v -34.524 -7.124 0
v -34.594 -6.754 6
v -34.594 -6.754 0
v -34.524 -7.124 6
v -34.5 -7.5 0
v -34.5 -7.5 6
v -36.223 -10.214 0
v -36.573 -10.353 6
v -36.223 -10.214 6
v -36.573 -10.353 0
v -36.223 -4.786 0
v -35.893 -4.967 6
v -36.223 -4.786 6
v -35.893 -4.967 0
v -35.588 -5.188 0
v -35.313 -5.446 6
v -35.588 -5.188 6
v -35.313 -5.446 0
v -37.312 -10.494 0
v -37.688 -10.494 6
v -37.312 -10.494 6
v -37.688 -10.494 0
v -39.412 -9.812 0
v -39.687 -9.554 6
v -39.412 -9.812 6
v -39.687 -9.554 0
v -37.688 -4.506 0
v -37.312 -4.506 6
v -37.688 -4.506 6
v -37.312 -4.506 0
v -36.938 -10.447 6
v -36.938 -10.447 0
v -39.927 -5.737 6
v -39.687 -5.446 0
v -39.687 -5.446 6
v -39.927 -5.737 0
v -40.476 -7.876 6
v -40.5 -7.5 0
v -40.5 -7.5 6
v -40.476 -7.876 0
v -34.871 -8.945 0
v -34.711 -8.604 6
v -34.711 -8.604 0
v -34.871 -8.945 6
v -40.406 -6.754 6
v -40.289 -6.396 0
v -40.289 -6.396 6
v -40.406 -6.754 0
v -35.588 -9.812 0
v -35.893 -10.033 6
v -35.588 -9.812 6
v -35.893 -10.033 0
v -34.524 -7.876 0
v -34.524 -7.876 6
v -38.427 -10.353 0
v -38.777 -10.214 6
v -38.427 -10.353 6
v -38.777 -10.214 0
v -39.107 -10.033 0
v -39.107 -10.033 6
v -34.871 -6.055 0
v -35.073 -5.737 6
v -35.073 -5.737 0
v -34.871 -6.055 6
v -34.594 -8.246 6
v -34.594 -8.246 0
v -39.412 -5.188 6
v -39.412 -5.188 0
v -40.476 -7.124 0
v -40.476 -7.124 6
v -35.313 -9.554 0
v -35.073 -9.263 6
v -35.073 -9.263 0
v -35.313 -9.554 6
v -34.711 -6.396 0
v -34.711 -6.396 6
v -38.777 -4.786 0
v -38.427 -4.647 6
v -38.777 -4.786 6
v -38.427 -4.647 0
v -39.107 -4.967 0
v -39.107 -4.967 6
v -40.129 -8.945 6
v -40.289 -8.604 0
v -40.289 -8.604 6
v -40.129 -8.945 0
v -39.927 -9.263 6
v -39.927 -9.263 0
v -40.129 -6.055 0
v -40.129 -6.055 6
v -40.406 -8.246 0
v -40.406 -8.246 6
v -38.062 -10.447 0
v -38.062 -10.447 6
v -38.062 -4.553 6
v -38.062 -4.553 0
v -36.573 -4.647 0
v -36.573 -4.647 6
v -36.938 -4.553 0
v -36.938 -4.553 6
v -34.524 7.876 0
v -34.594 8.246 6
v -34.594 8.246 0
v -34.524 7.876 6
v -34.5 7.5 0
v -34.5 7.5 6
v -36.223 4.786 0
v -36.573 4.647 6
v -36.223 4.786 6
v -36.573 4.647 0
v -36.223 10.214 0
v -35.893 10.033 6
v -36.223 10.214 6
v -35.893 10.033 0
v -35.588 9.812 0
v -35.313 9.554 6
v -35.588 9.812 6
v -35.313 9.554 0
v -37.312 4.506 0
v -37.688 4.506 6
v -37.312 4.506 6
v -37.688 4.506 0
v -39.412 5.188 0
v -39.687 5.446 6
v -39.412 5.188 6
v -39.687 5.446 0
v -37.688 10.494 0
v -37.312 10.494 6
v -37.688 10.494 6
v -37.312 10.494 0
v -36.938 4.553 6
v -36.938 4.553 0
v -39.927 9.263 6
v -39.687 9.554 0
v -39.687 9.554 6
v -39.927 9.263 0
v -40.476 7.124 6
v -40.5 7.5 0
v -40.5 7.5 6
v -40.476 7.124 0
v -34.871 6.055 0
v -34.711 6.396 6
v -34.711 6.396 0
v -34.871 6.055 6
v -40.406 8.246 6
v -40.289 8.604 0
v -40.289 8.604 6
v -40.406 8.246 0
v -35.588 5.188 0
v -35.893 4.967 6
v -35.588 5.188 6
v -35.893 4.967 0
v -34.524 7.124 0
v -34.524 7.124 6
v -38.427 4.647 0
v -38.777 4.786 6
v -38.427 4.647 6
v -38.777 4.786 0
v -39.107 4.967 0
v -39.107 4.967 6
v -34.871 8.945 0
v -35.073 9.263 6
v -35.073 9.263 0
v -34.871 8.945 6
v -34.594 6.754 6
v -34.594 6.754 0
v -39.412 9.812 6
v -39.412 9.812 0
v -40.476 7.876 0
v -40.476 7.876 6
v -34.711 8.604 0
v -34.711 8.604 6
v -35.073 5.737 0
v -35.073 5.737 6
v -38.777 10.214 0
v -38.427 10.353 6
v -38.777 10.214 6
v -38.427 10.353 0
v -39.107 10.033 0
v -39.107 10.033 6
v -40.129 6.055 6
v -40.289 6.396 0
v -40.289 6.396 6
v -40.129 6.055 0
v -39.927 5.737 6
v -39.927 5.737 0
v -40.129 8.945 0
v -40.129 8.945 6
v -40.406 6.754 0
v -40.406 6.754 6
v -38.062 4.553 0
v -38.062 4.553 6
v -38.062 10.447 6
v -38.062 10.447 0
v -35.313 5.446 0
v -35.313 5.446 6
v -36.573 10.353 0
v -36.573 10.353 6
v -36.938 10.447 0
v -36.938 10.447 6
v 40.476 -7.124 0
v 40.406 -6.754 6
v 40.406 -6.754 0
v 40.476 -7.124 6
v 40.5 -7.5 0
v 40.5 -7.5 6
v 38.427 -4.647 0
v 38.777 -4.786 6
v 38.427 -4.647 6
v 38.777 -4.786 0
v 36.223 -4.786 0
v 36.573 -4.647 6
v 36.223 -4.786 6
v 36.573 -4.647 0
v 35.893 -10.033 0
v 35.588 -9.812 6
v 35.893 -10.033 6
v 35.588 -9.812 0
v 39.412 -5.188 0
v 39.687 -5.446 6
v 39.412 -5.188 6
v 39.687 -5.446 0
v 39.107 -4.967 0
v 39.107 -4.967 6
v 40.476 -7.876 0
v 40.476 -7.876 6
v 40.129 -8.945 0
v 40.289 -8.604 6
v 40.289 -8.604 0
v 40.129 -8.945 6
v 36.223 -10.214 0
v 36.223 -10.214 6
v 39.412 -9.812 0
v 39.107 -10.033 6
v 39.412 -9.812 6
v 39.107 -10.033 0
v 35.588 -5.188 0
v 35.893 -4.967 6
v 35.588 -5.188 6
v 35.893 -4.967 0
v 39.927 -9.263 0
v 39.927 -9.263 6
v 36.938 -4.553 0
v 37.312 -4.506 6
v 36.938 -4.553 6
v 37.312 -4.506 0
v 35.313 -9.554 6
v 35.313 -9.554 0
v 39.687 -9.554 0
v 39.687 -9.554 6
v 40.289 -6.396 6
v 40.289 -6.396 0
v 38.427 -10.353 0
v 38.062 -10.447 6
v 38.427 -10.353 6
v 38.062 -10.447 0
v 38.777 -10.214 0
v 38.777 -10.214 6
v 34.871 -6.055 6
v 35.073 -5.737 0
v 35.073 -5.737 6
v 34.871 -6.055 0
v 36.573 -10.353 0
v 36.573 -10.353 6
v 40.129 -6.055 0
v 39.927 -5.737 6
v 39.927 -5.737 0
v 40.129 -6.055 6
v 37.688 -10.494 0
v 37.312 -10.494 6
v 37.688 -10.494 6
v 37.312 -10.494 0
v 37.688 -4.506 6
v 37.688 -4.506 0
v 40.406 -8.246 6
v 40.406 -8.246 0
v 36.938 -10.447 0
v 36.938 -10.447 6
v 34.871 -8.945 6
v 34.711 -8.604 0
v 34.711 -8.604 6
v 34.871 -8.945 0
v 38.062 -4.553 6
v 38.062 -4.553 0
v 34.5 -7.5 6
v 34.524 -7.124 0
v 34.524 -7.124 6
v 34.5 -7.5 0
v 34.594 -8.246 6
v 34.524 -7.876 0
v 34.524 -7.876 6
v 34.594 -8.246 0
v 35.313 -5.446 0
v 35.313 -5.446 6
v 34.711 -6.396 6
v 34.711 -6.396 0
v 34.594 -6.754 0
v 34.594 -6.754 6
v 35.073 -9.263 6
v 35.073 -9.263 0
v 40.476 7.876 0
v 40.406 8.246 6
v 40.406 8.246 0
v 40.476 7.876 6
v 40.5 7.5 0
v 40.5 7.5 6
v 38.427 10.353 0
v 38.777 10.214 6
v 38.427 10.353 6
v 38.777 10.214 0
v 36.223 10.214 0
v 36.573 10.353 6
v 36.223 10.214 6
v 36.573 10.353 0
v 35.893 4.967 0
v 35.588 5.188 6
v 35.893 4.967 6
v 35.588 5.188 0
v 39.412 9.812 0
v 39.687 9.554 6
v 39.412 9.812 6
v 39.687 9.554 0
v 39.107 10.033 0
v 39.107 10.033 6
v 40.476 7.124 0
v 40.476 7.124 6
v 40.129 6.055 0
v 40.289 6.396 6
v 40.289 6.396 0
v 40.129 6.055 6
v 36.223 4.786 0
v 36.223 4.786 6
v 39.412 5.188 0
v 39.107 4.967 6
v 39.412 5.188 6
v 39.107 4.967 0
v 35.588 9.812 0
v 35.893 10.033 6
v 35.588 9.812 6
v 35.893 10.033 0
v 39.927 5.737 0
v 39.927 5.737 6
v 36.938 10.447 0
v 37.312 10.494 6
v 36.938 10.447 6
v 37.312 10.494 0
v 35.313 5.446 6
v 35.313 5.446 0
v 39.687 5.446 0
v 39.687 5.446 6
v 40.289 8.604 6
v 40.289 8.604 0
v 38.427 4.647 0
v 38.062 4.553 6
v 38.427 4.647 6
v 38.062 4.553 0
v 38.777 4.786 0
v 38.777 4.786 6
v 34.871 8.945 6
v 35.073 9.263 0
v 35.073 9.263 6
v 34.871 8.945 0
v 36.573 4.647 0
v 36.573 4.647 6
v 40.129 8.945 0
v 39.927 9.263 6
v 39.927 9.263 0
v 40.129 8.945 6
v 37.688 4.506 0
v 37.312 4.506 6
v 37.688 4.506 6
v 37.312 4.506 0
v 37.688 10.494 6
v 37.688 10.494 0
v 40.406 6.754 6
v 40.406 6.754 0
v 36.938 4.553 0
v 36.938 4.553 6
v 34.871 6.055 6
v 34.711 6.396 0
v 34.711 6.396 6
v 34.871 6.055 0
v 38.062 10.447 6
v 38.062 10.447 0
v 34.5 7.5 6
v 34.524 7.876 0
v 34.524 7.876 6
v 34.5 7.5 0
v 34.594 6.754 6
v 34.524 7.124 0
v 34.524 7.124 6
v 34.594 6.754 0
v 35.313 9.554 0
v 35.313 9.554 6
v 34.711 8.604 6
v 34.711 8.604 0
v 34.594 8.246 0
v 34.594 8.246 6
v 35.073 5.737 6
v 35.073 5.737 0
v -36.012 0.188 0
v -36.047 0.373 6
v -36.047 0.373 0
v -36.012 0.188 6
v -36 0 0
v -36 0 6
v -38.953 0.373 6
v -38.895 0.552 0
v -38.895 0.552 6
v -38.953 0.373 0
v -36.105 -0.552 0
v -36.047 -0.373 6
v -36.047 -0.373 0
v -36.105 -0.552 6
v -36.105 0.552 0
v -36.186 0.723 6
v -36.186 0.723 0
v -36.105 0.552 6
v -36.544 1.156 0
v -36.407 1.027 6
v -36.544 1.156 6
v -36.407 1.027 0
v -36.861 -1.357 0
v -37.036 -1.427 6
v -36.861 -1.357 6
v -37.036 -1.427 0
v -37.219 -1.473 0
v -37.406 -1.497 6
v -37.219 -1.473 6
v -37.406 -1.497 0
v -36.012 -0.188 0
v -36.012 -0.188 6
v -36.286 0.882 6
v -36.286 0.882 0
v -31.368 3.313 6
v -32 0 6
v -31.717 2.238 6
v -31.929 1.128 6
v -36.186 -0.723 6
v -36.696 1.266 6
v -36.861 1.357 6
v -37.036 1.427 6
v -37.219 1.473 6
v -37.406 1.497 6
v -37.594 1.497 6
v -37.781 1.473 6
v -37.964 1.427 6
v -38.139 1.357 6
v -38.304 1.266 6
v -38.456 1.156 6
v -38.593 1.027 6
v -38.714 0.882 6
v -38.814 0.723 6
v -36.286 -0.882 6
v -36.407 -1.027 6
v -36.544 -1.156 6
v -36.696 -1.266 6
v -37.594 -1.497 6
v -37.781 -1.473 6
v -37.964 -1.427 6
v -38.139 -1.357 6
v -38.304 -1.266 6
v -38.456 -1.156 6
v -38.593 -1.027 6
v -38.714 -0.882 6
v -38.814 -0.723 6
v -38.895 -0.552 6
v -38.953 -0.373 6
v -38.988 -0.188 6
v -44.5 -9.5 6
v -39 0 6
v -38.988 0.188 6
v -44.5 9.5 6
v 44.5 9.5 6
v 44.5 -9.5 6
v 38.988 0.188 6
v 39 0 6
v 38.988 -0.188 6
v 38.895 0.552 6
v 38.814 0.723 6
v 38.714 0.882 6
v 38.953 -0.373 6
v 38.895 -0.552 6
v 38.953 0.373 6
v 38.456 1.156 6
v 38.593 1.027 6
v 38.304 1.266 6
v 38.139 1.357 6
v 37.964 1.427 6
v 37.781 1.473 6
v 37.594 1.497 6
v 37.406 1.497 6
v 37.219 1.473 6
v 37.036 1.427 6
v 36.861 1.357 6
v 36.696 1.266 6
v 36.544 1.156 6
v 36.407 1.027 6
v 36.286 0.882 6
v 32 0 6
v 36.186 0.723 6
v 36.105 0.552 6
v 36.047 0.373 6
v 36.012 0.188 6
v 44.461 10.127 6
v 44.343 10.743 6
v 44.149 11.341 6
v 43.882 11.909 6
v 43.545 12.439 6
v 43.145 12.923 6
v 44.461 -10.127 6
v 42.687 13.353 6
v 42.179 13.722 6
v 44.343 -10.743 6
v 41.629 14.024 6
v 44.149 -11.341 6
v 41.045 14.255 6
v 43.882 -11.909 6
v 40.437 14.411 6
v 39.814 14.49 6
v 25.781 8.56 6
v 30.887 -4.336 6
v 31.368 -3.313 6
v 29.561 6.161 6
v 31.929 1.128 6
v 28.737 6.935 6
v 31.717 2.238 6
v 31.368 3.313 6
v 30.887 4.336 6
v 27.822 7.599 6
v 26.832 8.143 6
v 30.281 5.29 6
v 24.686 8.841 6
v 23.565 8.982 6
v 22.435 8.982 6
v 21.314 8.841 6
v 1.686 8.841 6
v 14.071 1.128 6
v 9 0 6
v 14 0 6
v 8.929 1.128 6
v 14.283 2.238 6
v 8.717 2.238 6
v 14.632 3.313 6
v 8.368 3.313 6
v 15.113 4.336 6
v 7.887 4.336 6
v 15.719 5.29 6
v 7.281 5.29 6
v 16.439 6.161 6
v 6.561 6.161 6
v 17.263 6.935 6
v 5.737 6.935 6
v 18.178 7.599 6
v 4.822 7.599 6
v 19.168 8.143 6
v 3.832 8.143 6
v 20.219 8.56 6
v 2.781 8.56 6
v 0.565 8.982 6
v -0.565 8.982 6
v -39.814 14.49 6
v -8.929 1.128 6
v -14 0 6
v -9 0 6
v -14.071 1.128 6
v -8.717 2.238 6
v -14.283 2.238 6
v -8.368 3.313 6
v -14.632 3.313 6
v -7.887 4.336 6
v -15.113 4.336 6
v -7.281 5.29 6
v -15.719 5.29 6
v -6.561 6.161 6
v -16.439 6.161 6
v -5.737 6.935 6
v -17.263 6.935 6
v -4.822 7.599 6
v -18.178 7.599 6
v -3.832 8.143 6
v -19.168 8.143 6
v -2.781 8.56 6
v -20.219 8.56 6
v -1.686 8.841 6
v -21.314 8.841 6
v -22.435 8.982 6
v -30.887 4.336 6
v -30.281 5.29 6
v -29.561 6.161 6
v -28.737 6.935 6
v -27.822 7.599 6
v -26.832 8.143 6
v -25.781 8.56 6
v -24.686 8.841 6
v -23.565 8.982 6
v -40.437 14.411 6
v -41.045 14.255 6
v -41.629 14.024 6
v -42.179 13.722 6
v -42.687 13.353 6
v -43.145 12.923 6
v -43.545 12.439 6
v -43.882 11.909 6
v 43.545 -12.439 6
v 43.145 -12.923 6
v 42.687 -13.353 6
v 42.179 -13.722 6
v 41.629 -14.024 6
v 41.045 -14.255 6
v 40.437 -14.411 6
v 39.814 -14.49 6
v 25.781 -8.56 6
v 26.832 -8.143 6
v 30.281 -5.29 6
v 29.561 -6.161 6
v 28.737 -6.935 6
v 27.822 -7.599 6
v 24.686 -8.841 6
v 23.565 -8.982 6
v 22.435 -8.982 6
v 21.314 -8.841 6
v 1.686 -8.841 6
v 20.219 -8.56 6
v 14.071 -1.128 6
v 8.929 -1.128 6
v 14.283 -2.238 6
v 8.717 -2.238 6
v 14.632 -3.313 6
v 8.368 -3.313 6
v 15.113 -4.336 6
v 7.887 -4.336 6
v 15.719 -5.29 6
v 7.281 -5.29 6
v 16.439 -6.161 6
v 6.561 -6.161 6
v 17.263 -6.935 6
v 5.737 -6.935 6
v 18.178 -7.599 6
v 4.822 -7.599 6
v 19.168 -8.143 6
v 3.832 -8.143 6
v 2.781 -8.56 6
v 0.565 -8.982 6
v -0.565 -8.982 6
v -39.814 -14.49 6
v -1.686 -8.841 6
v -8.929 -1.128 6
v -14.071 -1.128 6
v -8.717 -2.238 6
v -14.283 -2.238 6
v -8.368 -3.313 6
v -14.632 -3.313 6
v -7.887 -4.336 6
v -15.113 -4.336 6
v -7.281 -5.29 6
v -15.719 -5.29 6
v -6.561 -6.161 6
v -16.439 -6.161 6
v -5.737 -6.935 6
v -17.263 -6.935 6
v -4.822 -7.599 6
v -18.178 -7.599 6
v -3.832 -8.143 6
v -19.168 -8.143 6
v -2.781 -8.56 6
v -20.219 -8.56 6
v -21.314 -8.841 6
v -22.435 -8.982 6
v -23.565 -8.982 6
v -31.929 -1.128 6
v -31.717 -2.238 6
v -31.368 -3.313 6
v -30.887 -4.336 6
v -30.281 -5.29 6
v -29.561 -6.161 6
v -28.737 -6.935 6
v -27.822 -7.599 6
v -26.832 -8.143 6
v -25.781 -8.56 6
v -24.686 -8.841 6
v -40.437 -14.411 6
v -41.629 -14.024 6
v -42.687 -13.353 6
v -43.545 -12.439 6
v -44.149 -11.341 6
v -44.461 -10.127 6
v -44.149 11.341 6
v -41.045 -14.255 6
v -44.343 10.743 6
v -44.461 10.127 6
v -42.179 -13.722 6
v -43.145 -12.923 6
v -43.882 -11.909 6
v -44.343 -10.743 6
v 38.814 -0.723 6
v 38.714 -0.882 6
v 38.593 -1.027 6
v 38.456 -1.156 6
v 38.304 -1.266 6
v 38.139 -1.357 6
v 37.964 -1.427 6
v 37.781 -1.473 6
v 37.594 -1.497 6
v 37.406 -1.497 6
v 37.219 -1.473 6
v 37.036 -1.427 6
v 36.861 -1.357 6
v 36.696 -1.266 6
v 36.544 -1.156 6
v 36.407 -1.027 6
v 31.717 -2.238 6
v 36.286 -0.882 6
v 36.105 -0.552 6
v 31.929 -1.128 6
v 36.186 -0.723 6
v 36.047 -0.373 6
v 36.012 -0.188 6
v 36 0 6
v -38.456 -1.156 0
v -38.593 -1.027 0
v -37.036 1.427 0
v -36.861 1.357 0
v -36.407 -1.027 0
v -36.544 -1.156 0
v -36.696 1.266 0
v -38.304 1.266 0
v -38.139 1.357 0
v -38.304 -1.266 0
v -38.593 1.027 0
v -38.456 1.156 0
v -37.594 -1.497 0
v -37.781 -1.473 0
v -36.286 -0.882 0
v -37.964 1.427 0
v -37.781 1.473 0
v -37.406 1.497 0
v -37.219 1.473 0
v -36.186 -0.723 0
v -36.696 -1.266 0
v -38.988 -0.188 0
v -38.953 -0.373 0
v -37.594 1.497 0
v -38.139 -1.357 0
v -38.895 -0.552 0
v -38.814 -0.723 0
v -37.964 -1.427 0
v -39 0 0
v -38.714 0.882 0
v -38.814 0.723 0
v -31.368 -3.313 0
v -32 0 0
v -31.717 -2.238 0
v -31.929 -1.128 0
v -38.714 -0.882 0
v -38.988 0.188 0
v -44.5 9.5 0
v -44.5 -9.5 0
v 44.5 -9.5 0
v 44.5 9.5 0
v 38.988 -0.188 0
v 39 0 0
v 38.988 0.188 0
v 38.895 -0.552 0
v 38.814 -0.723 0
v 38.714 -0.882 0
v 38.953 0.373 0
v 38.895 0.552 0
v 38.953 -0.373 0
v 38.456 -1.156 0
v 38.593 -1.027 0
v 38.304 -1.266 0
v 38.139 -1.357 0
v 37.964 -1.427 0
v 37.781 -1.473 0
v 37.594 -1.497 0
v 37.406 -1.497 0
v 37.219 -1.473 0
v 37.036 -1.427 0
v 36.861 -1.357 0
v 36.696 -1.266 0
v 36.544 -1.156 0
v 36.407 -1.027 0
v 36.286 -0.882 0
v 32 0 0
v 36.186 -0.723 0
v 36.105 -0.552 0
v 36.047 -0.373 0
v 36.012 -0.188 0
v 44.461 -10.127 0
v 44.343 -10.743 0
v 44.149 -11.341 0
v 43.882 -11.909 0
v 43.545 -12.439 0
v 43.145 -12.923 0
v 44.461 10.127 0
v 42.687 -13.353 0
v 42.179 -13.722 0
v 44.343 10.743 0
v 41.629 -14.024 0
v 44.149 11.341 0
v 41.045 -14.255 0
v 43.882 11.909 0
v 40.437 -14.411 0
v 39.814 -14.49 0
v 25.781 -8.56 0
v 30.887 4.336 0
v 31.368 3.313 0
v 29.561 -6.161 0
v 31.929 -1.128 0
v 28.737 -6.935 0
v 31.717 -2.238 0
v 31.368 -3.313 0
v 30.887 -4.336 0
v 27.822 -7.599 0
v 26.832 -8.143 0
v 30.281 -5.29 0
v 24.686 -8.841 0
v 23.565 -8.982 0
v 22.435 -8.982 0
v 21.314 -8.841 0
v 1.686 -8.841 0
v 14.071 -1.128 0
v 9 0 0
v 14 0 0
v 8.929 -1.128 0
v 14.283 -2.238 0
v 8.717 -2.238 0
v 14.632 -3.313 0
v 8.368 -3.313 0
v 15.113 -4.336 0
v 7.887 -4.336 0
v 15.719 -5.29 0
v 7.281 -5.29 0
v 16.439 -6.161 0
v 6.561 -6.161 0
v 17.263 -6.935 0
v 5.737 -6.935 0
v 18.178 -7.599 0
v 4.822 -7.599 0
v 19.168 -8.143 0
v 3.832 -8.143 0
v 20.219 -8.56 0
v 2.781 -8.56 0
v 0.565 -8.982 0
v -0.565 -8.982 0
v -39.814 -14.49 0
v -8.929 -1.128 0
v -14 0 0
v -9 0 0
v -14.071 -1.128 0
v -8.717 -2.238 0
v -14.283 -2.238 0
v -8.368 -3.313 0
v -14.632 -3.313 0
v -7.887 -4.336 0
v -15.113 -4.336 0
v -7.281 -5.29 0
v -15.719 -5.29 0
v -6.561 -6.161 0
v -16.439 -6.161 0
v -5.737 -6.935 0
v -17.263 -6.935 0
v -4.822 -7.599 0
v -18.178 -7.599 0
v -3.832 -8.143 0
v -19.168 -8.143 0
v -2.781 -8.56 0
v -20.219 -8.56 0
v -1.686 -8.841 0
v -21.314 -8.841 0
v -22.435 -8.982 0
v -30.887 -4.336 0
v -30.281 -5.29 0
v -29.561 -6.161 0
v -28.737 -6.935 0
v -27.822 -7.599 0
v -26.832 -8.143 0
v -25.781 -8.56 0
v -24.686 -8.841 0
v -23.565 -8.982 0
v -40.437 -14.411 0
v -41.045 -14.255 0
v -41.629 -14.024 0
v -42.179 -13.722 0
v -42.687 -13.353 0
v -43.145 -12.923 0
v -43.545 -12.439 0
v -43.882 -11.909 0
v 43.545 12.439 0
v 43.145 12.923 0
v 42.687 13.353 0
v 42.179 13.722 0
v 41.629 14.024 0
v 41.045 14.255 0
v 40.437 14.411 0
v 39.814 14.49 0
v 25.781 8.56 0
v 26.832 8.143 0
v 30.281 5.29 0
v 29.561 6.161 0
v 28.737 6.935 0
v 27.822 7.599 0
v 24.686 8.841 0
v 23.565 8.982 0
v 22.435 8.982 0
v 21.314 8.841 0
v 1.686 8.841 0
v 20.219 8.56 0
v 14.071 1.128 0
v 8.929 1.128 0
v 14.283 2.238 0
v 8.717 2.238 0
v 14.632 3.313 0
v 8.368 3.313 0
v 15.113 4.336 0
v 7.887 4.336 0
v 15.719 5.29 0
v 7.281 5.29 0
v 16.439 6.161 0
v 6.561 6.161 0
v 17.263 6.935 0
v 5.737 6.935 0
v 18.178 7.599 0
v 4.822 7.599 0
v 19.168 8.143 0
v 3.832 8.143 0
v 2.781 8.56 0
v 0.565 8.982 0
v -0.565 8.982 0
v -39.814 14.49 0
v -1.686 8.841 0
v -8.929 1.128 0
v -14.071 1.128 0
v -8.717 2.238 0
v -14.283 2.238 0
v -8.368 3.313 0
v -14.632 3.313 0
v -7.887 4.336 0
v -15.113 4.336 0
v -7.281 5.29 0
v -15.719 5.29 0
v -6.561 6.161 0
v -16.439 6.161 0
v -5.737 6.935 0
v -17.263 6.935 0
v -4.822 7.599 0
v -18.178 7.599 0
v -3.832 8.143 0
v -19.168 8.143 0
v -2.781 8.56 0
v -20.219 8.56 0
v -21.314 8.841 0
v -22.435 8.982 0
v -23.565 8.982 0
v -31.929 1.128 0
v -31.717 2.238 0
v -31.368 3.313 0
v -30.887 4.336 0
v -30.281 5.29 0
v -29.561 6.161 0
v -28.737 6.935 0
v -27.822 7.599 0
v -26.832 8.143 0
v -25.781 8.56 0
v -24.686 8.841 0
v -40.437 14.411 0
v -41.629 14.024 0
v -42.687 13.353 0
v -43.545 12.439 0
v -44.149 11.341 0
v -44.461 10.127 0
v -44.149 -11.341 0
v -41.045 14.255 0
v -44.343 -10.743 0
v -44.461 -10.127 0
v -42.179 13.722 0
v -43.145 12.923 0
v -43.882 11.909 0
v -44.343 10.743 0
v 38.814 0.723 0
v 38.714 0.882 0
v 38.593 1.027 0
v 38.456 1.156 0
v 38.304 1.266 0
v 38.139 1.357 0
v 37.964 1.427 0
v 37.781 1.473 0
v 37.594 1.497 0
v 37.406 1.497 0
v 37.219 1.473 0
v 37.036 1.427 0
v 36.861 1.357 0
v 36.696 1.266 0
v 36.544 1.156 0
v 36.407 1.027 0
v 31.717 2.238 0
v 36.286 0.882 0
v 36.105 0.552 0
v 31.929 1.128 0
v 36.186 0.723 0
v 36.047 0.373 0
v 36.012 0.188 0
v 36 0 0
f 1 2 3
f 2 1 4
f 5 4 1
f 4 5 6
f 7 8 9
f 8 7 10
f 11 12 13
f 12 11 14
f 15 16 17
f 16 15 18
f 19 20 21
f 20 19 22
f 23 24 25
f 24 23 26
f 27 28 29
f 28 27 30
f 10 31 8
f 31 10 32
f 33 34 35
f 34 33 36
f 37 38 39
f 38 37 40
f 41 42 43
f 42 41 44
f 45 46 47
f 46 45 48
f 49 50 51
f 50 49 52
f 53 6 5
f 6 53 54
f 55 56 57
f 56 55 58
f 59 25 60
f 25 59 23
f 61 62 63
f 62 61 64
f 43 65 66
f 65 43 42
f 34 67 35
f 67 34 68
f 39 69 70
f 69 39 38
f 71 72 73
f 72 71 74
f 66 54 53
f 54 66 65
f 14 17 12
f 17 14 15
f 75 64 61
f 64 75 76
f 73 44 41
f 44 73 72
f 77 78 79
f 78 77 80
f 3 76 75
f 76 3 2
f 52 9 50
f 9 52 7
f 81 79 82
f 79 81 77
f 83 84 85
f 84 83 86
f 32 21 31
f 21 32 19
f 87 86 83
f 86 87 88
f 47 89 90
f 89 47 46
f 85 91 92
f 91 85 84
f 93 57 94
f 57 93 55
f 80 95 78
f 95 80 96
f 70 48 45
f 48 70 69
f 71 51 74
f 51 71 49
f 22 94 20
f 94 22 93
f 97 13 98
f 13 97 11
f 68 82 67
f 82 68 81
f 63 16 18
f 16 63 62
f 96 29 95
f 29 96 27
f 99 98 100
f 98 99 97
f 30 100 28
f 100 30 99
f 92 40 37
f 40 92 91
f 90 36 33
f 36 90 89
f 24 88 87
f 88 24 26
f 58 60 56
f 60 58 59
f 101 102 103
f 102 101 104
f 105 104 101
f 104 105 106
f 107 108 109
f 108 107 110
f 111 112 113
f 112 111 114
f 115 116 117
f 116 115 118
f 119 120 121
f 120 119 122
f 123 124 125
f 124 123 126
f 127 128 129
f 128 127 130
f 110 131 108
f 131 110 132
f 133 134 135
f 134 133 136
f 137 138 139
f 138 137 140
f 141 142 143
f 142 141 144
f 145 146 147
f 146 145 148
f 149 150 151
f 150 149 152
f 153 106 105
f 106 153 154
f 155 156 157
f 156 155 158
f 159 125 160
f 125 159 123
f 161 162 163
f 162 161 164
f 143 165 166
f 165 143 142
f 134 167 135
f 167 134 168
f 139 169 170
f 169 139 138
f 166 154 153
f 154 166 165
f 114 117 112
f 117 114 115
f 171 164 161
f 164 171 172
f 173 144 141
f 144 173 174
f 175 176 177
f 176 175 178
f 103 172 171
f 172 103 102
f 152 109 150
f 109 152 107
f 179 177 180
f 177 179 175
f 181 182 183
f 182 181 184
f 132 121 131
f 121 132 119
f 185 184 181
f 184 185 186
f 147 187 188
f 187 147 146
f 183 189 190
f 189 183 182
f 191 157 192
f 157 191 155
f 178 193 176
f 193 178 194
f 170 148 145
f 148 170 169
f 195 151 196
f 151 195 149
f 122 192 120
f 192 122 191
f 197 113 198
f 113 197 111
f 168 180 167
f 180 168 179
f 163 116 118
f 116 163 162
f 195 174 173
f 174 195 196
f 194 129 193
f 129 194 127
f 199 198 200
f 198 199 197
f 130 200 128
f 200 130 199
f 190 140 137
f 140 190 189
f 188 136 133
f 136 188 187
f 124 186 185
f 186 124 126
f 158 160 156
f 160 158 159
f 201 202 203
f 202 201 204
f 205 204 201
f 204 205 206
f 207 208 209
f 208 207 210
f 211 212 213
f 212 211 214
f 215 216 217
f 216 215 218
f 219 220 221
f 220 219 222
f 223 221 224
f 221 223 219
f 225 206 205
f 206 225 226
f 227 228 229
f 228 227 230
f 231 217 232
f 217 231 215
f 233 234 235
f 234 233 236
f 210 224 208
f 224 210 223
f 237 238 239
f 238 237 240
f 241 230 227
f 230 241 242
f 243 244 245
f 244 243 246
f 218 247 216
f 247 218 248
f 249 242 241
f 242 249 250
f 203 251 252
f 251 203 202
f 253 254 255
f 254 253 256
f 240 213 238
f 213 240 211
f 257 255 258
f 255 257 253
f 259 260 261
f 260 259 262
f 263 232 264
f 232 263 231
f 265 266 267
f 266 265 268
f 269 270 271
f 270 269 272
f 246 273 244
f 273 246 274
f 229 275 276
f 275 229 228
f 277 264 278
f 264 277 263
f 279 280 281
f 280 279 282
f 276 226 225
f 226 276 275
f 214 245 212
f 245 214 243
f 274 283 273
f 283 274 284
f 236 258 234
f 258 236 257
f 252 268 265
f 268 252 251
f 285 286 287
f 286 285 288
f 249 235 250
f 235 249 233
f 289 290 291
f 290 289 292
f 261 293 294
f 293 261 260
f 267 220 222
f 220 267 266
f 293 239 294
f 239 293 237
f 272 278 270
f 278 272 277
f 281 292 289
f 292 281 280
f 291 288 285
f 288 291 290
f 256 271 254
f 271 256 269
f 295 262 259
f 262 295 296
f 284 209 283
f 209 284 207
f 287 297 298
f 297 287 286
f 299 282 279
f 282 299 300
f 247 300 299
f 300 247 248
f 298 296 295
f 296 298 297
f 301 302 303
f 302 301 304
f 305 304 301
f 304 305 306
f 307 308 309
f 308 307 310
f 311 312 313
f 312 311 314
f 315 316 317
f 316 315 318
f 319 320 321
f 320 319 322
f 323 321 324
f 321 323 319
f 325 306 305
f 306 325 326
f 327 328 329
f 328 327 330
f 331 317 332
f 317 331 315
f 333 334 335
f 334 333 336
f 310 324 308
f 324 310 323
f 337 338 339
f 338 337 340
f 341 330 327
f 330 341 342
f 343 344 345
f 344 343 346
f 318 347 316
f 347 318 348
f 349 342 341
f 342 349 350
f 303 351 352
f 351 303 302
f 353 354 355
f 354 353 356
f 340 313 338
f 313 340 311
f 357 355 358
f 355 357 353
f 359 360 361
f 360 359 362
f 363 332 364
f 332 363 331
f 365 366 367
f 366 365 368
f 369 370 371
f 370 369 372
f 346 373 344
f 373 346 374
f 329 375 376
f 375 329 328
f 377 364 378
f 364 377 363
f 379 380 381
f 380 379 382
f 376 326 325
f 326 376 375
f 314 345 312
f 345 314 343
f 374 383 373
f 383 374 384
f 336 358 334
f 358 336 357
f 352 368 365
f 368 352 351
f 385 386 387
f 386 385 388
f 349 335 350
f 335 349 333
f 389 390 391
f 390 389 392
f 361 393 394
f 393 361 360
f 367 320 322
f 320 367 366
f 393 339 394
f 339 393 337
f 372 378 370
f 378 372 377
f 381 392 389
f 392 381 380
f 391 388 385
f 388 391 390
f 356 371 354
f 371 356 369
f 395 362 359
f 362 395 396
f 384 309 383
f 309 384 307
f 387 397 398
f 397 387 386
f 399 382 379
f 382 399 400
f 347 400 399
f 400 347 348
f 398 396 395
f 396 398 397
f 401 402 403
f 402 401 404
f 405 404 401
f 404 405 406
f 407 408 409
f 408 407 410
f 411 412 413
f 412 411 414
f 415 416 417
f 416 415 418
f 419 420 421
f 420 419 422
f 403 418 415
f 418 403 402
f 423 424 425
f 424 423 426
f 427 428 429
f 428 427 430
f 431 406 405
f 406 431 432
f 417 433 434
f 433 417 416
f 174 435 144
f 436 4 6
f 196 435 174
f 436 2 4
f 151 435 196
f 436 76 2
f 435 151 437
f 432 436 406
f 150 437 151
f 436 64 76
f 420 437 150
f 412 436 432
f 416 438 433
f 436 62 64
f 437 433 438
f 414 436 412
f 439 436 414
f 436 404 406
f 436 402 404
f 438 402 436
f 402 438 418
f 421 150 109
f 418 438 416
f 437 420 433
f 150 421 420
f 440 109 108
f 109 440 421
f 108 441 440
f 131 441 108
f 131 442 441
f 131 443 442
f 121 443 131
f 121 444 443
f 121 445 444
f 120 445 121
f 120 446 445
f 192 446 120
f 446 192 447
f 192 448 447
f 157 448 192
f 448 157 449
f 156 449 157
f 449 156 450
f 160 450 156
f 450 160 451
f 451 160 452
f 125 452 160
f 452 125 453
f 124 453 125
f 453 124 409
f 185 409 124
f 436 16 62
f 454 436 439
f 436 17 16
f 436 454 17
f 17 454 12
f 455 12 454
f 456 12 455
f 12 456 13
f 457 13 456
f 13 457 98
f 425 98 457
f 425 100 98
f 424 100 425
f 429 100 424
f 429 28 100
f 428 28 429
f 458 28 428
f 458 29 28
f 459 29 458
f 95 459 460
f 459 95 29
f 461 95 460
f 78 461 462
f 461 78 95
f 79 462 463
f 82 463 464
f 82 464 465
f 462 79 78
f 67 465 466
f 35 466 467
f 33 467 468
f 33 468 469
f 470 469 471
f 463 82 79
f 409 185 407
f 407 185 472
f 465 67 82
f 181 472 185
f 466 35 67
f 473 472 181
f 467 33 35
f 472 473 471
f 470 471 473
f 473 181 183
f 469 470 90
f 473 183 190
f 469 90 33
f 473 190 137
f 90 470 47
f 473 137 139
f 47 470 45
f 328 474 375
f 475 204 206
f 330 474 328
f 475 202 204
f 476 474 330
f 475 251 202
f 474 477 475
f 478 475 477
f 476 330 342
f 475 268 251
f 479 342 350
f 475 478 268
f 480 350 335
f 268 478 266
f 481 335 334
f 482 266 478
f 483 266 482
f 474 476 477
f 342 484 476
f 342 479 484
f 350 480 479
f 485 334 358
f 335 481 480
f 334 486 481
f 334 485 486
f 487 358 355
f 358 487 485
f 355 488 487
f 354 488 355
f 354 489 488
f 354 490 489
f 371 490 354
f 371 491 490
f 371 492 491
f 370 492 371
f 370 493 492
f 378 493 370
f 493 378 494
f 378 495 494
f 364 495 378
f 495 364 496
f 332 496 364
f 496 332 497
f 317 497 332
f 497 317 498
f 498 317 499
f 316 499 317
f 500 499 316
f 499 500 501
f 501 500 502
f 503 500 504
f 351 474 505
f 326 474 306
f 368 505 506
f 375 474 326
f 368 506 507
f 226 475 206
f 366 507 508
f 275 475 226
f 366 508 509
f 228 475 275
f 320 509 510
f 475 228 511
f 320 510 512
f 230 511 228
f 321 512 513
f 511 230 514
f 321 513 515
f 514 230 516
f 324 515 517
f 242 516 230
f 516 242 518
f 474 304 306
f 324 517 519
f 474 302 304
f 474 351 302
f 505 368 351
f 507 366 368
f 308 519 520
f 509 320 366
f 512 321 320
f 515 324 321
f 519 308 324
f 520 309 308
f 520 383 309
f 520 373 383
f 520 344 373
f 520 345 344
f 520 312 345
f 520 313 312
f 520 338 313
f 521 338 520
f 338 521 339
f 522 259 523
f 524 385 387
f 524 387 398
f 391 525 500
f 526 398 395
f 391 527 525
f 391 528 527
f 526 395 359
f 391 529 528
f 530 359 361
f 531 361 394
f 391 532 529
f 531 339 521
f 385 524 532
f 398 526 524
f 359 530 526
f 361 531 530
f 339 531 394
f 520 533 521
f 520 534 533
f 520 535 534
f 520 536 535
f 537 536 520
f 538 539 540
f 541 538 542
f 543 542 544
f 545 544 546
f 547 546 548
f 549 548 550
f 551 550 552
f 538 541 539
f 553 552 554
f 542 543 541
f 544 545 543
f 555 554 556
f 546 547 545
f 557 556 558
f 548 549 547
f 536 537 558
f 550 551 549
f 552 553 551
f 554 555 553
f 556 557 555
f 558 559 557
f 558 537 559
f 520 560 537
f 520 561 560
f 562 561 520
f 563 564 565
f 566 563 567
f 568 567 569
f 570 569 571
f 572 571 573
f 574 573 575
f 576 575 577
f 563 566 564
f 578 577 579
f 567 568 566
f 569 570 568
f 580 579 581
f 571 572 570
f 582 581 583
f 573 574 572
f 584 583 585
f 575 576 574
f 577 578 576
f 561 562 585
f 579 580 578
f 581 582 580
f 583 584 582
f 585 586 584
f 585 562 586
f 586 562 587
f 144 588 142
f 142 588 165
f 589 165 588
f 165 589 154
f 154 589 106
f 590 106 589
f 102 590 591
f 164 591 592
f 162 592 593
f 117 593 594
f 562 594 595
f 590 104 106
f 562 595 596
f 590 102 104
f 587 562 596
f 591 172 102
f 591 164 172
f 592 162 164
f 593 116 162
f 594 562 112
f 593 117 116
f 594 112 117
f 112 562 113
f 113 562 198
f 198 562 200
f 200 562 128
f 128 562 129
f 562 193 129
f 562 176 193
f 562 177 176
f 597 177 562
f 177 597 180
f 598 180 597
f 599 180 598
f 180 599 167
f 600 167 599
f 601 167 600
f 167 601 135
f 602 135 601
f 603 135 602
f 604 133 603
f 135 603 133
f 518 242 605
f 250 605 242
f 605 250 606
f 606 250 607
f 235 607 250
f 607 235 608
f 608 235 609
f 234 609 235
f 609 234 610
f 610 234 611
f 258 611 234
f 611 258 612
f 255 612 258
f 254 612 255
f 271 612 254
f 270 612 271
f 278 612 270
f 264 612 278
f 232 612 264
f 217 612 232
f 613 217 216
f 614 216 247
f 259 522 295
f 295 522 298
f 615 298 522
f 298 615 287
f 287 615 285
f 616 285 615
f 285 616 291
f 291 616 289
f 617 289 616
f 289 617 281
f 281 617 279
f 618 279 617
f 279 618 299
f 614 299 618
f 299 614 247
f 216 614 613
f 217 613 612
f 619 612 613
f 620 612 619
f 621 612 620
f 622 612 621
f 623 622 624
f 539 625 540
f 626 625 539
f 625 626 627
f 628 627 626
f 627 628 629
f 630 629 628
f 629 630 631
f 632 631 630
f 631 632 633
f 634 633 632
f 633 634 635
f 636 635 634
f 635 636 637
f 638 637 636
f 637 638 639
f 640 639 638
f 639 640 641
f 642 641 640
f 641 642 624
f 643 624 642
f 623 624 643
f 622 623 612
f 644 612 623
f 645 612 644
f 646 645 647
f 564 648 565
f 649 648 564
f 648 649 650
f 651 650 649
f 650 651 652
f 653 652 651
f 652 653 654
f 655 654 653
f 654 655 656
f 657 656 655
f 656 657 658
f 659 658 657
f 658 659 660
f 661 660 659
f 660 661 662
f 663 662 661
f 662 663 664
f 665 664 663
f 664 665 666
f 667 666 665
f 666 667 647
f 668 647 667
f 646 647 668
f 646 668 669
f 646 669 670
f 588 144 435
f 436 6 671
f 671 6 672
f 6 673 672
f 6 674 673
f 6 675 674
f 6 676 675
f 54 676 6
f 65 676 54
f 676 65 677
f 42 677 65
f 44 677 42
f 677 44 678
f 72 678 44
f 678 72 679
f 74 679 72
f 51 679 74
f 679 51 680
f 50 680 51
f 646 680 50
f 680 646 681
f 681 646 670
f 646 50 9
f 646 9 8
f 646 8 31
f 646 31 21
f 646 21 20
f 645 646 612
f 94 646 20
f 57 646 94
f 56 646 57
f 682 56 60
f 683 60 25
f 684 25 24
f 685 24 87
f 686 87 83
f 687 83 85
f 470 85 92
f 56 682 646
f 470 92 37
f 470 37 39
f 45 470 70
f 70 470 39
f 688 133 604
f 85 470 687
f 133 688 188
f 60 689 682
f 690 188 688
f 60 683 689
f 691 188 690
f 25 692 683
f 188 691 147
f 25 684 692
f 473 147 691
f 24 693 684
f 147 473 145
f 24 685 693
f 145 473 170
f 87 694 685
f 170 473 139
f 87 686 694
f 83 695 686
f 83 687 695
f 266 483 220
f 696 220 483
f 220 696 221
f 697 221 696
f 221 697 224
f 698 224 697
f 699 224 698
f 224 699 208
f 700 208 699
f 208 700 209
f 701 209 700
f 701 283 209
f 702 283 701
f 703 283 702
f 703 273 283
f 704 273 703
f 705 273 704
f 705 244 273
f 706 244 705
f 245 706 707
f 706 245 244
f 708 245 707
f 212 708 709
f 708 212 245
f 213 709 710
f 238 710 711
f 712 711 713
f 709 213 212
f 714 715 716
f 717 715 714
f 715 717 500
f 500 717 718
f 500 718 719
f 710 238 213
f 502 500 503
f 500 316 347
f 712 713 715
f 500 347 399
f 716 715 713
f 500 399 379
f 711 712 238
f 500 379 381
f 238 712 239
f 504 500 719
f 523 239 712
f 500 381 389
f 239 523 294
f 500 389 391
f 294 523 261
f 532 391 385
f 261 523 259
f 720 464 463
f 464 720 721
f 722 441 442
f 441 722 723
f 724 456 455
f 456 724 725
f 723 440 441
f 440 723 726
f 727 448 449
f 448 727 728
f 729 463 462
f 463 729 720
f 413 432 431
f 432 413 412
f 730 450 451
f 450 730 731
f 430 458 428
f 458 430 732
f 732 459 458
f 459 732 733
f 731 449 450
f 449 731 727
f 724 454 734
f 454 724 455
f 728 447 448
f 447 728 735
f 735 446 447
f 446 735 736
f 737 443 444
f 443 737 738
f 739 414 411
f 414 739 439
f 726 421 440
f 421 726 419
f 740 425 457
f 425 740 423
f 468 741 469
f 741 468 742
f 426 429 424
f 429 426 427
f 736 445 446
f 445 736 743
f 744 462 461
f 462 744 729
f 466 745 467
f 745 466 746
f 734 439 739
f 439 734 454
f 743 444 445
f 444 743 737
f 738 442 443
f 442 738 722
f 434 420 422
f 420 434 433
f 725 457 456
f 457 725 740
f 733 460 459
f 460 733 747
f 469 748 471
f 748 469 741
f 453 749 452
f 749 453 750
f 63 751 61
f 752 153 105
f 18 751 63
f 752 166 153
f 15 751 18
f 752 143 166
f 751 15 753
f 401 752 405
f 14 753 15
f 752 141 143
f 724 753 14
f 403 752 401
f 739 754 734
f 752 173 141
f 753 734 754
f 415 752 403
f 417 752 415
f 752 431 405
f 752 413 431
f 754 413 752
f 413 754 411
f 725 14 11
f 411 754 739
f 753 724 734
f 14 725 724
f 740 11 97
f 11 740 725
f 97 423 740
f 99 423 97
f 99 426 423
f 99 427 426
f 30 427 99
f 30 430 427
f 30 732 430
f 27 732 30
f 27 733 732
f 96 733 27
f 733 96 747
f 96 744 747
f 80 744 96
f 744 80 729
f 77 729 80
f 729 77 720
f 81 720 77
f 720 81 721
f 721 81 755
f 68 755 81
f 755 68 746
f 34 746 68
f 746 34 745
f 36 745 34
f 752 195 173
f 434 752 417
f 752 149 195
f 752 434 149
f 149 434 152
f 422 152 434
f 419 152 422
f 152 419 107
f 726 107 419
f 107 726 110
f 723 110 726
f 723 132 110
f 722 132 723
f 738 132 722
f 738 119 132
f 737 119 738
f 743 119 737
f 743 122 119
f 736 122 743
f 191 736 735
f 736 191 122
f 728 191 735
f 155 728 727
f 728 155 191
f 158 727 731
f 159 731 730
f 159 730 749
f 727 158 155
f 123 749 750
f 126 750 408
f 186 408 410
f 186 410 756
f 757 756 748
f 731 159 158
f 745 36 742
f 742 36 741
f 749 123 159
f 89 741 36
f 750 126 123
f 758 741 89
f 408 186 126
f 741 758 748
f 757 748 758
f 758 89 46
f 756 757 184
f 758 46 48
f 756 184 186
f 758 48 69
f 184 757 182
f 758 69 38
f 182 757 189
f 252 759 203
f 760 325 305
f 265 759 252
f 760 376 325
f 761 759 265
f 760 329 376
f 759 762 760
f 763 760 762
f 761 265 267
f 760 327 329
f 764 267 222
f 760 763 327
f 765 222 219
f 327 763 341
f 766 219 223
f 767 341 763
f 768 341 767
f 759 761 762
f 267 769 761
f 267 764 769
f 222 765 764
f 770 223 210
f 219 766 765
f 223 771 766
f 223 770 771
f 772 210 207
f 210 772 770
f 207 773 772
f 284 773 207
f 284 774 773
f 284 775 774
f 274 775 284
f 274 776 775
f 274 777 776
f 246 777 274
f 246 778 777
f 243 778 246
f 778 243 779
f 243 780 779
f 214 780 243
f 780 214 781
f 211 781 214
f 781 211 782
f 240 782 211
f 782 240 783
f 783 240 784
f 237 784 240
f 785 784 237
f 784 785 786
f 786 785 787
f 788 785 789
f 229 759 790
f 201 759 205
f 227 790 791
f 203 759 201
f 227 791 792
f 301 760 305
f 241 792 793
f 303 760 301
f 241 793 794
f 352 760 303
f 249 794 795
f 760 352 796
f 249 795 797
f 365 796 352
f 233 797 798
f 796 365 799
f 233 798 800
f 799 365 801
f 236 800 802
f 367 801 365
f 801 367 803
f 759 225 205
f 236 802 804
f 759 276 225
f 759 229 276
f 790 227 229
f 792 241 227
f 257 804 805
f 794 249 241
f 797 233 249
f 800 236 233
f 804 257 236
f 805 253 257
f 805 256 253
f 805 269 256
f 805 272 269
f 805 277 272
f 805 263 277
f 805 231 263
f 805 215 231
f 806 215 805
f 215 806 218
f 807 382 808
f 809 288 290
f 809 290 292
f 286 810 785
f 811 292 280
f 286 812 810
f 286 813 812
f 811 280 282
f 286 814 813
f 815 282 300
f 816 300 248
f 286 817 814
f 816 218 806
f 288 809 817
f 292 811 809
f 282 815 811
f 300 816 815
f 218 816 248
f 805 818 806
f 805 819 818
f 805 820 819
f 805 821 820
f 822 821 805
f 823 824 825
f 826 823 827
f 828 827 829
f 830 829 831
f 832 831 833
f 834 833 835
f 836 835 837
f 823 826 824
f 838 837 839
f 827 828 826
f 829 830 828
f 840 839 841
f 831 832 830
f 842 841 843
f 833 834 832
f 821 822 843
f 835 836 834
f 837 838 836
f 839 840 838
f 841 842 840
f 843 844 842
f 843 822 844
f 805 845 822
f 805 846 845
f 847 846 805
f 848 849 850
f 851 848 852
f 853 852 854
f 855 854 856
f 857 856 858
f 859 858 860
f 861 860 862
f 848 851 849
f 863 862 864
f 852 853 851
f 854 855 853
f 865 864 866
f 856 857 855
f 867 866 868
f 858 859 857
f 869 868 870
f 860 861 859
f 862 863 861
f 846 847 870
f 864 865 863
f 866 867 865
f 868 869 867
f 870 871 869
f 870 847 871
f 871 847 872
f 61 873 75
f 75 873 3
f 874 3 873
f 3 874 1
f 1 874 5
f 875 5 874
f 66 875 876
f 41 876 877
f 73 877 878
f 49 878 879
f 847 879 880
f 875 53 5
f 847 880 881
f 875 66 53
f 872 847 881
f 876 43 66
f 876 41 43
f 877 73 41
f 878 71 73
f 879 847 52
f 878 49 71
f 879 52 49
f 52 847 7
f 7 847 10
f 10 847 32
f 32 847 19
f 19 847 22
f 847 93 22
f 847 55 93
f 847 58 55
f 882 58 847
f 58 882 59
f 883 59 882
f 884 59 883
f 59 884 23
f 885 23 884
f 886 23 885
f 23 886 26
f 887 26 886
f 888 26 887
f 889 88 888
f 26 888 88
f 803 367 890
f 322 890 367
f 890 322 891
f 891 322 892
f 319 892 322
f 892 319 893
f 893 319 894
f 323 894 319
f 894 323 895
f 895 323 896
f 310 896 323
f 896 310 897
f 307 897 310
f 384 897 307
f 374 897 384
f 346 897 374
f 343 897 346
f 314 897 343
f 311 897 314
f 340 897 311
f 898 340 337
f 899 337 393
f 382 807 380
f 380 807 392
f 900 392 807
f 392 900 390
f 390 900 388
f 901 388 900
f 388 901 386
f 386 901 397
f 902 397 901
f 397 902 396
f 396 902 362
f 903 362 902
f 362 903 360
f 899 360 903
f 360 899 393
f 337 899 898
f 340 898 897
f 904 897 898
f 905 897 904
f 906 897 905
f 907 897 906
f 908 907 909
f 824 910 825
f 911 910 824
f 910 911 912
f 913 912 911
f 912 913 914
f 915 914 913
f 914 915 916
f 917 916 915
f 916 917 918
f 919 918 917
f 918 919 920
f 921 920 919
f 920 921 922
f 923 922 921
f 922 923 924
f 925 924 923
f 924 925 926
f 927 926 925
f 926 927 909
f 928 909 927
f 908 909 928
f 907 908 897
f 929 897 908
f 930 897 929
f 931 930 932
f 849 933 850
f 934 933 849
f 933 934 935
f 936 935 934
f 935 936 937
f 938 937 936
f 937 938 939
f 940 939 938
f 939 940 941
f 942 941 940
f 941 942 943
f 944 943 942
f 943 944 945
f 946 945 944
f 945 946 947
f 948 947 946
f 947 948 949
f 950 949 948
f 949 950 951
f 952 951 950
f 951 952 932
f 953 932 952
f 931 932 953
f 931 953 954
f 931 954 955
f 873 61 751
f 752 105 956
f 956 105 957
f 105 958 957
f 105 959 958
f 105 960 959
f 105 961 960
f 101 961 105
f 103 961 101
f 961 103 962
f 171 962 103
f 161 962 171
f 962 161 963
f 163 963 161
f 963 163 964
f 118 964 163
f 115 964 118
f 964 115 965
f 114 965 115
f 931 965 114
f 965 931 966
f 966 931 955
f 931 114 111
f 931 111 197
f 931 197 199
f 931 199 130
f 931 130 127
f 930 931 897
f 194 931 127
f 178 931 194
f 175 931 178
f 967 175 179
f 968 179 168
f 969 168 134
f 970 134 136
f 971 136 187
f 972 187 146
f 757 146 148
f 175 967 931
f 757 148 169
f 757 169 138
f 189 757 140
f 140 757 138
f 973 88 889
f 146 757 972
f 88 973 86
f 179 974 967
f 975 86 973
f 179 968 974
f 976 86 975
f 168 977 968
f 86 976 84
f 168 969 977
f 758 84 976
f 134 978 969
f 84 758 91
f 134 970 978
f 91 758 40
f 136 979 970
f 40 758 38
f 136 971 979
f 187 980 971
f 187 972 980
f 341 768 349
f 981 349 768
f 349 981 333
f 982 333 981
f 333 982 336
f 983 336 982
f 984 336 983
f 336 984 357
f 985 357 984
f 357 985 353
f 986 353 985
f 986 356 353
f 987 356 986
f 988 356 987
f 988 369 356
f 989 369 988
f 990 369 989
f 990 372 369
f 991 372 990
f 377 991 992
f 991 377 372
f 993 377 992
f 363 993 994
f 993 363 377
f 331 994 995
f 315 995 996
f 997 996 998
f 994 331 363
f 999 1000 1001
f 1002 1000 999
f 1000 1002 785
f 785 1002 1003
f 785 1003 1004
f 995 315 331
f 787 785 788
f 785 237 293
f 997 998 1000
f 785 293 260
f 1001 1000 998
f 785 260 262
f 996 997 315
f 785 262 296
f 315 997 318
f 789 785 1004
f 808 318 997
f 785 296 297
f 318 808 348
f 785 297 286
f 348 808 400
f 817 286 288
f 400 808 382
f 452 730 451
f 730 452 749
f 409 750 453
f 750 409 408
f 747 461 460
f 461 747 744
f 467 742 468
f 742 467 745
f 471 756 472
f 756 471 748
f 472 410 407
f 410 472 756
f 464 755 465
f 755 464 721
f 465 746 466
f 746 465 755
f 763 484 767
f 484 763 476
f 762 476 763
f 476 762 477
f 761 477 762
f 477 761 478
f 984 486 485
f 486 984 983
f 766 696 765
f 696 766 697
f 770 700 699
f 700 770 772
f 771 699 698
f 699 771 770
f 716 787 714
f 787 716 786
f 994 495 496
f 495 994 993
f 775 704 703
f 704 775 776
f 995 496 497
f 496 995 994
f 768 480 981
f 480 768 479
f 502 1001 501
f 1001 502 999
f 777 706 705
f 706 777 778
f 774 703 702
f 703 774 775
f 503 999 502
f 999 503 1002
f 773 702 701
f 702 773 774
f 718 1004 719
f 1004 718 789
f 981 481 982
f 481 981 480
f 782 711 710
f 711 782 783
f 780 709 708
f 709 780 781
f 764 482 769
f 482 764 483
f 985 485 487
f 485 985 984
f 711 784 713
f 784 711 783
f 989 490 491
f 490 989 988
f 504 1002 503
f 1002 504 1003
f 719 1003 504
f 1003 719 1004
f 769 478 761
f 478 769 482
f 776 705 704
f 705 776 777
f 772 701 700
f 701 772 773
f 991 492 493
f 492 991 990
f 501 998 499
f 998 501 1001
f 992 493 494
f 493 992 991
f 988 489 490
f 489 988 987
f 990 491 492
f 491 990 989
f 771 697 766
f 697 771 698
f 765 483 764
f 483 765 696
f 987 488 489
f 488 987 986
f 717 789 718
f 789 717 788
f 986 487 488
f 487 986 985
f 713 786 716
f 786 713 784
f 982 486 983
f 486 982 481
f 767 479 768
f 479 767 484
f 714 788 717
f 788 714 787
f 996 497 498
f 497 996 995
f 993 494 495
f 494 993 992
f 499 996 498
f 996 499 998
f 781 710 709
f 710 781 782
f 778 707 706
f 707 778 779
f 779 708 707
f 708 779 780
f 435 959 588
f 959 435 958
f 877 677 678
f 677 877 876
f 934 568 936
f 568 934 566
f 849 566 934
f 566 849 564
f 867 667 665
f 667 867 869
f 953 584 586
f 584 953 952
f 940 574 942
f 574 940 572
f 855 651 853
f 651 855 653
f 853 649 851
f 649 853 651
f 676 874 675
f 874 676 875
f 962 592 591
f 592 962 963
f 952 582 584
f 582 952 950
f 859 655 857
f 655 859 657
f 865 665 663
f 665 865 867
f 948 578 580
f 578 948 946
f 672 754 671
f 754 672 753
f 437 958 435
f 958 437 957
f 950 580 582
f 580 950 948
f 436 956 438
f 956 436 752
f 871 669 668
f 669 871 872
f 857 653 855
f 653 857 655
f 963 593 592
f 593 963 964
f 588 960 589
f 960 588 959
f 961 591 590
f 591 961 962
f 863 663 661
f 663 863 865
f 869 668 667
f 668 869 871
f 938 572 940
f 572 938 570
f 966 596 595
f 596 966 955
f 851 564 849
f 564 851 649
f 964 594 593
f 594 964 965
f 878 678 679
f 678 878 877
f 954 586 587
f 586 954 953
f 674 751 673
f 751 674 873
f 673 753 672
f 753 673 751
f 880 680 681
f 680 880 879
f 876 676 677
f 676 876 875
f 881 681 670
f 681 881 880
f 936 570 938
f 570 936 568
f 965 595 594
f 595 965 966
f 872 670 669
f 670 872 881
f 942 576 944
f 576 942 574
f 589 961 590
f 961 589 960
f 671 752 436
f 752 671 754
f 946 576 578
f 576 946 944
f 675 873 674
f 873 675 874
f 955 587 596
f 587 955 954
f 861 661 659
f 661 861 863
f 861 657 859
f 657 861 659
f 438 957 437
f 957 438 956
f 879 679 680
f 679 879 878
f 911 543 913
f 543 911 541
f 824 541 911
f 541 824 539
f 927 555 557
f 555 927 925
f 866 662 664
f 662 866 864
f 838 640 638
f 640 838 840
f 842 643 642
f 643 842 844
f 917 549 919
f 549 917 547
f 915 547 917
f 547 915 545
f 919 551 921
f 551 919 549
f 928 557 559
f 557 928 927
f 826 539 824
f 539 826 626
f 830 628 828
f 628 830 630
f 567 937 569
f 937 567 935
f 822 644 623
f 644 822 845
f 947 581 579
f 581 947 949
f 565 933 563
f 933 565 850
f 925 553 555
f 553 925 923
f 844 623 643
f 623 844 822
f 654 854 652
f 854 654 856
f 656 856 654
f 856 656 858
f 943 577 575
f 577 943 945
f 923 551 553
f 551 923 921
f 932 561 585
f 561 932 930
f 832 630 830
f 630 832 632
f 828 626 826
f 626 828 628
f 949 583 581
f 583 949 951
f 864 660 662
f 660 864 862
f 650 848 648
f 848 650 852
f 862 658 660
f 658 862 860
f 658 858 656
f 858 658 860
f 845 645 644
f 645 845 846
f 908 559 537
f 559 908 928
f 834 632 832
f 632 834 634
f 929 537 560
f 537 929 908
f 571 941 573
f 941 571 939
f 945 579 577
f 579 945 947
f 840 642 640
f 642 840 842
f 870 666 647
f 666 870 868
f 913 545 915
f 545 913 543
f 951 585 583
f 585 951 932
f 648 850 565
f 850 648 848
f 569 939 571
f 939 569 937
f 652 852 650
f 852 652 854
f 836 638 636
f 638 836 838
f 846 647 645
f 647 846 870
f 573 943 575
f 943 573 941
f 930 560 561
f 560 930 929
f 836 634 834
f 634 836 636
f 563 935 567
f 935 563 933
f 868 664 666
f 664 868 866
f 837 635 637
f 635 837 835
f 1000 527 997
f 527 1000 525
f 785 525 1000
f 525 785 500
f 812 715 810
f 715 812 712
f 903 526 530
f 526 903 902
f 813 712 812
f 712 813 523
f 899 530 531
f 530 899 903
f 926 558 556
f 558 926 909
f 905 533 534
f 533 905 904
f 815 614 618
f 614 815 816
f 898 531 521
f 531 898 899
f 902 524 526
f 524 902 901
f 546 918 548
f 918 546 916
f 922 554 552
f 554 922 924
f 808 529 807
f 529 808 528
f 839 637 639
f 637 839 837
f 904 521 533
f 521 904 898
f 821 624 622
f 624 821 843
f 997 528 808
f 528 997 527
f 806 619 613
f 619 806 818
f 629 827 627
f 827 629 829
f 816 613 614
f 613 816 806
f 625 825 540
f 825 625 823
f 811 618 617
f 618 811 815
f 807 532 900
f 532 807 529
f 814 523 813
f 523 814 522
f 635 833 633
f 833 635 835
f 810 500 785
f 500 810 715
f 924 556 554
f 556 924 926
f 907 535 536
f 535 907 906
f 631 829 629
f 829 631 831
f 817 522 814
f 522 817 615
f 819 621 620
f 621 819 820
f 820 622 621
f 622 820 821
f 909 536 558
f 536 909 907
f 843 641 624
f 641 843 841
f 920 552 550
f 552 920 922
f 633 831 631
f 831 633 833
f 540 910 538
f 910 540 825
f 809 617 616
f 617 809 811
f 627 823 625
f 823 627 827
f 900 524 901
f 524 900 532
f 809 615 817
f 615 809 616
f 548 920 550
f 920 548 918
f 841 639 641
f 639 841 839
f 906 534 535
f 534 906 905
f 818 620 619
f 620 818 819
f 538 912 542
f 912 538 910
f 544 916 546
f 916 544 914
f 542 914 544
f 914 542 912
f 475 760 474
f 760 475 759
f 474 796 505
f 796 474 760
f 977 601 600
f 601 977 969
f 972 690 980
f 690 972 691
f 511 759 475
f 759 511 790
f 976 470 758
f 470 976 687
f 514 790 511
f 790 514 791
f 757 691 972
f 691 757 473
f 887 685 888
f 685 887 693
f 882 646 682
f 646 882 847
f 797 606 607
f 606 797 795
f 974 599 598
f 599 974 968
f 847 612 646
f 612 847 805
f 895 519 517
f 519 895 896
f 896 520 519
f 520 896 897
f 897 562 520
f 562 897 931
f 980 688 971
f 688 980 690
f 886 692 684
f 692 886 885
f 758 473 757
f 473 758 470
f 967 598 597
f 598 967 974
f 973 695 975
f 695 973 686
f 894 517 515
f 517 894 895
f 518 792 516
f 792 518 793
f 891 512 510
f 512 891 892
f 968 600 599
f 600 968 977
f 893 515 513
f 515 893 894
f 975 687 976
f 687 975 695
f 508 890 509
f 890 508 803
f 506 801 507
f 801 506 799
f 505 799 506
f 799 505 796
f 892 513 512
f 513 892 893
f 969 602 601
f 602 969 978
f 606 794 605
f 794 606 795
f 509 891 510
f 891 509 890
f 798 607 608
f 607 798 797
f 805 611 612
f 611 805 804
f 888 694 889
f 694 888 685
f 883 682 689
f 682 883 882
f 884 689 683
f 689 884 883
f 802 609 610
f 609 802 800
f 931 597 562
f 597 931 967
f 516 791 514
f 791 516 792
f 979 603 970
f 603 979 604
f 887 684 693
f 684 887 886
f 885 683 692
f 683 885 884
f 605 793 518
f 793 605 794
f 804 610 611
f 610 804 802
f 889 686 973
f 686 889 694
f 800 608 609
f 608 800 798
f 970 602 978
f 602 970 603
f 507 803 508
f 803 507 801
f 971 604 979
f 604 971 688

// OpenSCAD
$fn = 50;


difference() {
	union() {
		hull() {
			translate(v = [-39.5000000000, 9.5000000000, 0]) {
				cylinder(h = 6, r = 5);
			}
			translate(v = [39.5000000000, 9.5000000000, 0]) {
				cylinder(h = 6, r = 5);
			}
			translate(v = [-39.5000000000, -9.5000000000, 0]) {
				cylinder(h = 6, r = 5);
			}
			translate(v = [39.5000000000, -9.5000000000, 0]) {
				cylinder(h = 6, r = 5);
			}
		}
	}
	union() {
		#translate(v = [-37.5000000000, -7.5000000000, 0]) {
			cylinder(h = 6, r = 3.0000000000);
		}
		#translate(v = [-37.5000000000, 7.5000000000, 0]) {
			cylinder(h = 6, r = 3.0000000000);
		}
		#translate(v = [37.5000000000, -7.5000000000, 0]) {
			cylinder(h = 6, r = 3.0000000000);
		}
		#translate(v = [37.5000000000, 7.5000000000, 0]) {
			cylinder(h = 6, r = 3.0000000000);
		}
		#translate(v = [-37.5000000000, -7.5000000000, -100.0000000000]) {
			cylinder(h = 200, r = 3.0000000000);
		}
		#translate(v = [-37.5000000000, 7.5000000000, -100.0000000000]) {
			cylinder(h = 200, r = 3.0000000000);
		}
		#translate(v = [37.5000000000, -7.5000000000, -100.0000000000]) {
			cylinder(h = 200, r = 3.0000000000);
		}
		#translate(v = [37.5000000000, 7.5000000000, -100.0000000000]) {
			cylinder(h = 200, r = 3.0000000000);
		}
		#translate(v = [-37.5000000000, -7.5000000000, 0]) {
			cylinder(h = 6, r = 1.5000000000);
		}
		#translate(v = [-37.5000000000, 0.0000000000, 0]) {
			cylinder(h = 6, r = 1.5000000000);
		}
		#translate(v = [-37.5000000000, 7.5000000000, 0]) {
			cylinder(h = 6, r = 1.5000000000);
		}
		#translate(v = [37.5000000000, -7.5000000000, 0]) {
			cylinder(h = 6, r = 1.5000000000);
		}
		#translate(v = [37.5000000000, 0.0000000000, 0]) {
			cylinder(h = 6, r = 1.5000000000);
		}
		#translate(v = [37.5000000000, 7.5000000000, 0]) {
			cylinder(h = 6, r = 1.5000000000);
		}
		#translate(v = [-37.5000000000, -7.5000000000, 0]) {
			cylinder(h = 6, r = 1.5000000000);
		}
		#translate(v = [-37.5000000000, 0.0000000000, 0]) {
			cylinder(h = 6, r = 1.5000000000);
		}
		#translate(v = [-37.5000000000, 7.5000000000, 0]) {
			cylinder(h = 6, r = 1.5000000000);
		}
		#translate(v = [37.5000000000, -7.5000000000, 0]) {
			cylinder(h = 6, r = 1.5000000000);
		}
		#translate(v = [37.5000000000, 0.0000000000, 0]) {
			cylinder(h = 6, r = 1.5000000000);
		}
		#translate(v = [37.5000000000, 7.5000000000, 0]) {
			cylinder(h = 6, r = 1.5000000000);
		}
		#translate(v = [-37.5000000000, -7.5000000000, 0]) {
			cylinder(h = 6, r = 1.5000000000);
		}
		#translate(v = [-37.5000000000, 0.0000000000, 0]) {
			cylinder(h = 6, r = 1.5000000000);
		}
		#translate(v = [-37.5000000000, 7.5000000000, 0]) {
			cylinder(h = 6, r = 1.5000000000);
		}
		#translate(v = [37.5000000000, -7.5000000000, 0]) {
			cylinder(h = 6, r = 1.5000000000);
		}
		#translate(v = [37.5000000000, 0.0000000000, 0]) {
			cylinder(h = 6, r = 1.5000000000);
		}
		#translate(v = [37.5000000000, 7.5000000000, 0]) {
			cylinder(h = 6, r = 1.5000000000);
		}
		#translate(v = [-23.0000000000, 0, 0]) {
			cylinder(h = 6, r = 9.0000000000);
		}
		#cylinder(h = 6, r = 9.0000000000);
		#translate(v = [23.0000000000, 0, 0]) {
			cylinder(h = 6, r = 9.0000000000);
		}
	}
}
